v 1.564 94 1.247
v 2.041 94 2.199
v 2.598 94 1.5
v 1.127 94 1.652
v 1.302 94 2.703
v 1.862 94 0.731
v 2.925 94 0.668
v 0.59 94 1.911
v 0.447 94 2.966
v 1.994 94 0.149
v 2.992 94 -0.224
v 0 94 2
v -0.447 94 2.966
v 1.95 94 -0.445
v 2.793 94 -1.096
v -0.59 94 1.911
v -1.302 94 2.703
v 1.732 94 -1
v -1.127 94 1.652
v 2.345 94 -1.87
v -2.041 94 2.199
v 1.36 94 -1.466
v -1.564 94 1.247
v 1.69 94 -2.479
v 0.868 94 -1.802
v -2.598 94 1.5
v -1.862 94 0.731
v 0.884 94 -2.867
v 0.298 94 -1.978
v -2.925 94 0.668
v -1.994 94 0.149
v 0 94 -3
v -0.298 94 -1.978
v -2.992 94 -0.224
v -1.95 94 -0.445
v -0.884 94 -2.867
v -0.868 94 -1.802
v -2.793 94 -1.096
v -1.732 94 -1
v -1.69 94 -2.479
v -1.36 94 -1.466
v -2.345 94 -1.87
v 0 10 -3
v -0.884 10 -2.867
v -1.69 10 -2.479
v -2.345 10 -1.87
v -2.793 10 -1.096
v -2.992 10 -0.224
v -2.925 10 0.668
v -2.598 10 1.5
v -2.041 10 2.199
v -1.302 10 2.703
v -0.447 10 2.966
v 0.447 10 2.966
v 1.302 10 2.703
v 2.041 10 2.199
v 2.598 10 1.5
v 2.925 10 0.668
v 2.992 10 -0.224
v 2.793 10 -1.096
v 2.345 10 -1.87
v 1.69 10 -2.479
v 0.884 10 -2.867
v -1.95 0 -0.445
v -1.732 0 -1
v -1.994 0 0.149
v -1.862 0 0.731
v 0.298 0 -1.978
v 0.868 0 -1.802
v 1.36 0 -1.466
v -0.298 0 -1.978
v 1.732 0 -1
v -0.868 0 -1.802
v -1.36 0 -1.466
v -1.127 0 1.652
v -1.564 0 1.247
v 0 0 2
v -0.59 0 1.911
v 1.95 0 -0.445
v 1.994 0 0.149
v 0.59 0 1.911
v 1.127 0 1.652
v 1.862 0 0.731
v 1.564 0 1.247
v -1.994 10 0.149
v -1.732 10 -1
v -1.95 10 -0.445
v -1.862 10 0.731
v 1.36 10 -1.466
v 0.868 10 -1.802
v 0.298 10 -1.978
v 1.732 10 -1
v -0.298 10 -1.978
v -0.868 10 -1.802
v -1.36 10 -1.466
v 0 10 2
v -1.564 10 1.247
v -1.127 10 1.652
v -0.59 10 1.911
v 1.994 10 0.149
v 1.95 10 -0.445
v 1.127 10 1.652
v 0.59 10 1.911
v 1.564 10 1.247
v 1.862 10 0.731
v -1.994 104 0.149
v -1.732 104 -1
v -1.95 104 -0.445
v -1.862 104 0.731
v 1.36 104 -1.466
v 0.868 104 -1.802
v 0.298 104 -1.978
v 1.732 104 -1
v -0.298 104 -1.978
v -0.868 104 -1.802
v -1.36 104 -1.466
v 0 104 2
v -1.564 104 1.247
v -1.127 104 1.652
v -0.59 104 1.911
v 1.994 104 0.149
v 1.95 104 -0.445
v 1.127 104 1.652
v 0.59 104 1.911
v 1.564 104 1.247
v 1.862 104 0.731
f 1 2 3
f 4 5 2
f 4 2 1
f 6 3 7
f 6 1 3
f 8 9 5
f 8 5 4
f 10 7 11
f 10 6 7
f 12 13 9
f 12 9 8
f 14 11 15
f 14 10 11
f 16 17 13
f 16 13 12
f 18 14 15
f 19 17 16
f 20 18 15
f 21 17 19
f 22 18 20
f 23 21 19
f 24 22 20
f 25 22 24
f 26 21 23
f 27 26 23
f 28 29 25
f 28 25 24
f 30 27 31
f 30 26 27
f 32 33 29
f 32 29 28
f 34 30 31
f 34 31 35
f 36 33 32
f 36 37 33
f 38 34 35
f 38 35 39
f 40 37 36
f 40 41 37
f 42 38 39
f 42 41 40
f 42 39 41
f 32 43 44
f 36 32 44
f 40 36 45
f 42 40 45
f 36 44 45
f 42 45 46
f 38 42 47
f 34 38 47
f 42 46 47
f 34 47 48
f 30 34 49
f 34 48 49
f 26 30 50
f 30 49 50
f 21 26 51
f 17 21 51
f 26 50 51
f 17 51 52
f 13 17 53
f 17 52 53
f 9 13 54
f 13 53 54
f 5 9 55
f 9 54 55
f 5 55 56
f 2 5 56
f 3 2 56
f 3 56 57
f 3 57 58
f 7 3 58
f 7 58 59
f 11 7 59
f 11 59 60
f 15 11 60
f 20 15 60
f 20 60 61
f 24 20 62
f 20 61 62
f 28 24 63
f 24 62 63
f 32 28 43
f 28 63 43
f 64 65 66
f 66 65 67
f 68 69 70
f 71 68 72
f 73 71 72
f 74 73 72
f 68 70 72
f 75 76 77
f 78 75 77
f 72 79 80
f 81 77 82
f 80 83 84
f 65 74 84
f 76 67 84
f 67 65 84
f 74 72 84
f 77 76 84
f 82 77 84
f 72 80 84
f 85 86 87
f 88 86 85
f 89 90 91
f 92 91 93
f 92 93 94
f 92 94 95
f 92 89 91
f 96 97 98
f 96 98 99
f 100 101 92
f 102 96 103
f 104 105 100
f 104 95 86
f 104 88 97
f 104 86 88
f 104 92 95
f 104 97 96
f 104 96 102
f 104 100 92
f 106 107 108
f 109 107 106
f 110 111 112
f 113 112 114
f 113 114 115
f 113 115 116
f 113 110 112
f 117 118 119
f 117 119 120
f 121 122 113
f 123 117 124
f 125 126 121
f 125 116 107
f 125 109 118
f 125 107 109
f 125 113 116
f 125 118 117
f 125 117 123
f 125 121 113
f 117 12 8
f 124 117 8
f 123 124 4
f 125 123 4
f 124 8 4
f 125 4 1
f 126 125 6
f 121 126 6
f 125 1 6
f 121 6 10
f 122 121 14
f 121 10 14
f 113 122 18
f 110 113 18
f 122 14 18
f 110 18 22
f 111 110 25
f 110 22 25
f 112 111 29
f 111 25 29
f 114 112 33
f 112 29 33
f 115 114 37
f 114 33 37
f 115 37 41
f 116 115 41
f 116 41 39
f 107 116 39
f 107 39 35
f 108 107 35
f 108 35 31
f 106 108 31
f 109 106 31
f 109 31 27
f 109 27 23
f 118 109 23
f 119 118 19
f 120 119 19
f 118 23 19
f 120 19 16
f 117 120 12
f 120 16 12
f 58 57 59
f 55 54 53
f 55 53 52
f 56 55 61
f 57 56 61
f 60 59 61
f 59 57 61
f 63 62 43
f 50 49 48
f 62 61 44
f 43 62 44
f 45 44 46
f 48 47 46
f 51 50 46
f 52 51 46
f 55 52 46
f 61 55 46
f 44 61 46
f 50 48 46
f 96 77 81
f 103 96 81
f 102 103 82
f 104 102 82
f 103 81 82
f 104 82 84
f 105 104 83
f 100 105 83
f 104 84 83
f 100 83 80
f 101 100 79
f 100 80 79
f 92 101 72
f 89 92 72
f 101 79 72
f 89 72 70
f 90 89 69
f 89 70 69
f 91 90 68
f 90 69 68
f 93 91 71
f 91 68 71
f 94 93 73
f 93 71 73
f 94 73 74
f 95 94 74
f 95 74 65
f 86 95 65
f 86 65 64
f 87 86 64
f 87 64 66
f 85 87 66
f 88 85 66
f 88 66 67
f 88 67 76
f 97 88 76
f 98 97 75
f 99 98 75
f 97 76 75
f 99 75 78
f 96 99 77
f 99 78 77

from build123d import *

# Parameters (mm, degrees)
SKETCH1_R           = 2
BOSS_EXTRUDE1_DEPTH = 10
SKETCH2_R           = 3
BOSS_EXTRUDE2_DEPTH = 84
SKETCH3_R           = 2
BOSS_EXTRUDE3_DEPTH = 10


with BuildPart() as part:
    # Sketch1 → Boss-Extrude1 (new body)
    with BuildSketch(Plane(origin=(0, 0, 0), x_dir=(1, 0, 0), z_dir=(0, 1, 0))):
        with Locations(Location((0, 0, 0), (0, 0, 270))):
            Circle(SKETCH1_R)
    extrude(amount=BOSS_EXTRUDE1_DEPTH)


with BuildPart() as body_2:
    # Sketch2 → Boss-Extrude2 (new body)
    with BuildSketch(Plane(origin=(0, 10, 0), x_dir=(1, 0, 0), z_dir=(0, 1, 0))):
        with Locations(Location((0, 0, 0), (0, 0, 90))):
            Circle(SKETCH2_R)
    extrude(amount=BOSS_EXTRUDE2_DEPTH)

    # Sketch3 → Boss-Extrude3 (add)
    with BuildSketch(Plane(origin=(0, 94, 0), x_dir=(1, 0, 0), z_dir=(0, 1, 0))):
        with Locations(Location((0, 0, 0), (0, 0, 270))):
            Circle(SKETCH3_R)
    extrude(amount=BOSS_EXTRUDE3_DEPTH)


solid = Compound([part.part, body_2.part])
